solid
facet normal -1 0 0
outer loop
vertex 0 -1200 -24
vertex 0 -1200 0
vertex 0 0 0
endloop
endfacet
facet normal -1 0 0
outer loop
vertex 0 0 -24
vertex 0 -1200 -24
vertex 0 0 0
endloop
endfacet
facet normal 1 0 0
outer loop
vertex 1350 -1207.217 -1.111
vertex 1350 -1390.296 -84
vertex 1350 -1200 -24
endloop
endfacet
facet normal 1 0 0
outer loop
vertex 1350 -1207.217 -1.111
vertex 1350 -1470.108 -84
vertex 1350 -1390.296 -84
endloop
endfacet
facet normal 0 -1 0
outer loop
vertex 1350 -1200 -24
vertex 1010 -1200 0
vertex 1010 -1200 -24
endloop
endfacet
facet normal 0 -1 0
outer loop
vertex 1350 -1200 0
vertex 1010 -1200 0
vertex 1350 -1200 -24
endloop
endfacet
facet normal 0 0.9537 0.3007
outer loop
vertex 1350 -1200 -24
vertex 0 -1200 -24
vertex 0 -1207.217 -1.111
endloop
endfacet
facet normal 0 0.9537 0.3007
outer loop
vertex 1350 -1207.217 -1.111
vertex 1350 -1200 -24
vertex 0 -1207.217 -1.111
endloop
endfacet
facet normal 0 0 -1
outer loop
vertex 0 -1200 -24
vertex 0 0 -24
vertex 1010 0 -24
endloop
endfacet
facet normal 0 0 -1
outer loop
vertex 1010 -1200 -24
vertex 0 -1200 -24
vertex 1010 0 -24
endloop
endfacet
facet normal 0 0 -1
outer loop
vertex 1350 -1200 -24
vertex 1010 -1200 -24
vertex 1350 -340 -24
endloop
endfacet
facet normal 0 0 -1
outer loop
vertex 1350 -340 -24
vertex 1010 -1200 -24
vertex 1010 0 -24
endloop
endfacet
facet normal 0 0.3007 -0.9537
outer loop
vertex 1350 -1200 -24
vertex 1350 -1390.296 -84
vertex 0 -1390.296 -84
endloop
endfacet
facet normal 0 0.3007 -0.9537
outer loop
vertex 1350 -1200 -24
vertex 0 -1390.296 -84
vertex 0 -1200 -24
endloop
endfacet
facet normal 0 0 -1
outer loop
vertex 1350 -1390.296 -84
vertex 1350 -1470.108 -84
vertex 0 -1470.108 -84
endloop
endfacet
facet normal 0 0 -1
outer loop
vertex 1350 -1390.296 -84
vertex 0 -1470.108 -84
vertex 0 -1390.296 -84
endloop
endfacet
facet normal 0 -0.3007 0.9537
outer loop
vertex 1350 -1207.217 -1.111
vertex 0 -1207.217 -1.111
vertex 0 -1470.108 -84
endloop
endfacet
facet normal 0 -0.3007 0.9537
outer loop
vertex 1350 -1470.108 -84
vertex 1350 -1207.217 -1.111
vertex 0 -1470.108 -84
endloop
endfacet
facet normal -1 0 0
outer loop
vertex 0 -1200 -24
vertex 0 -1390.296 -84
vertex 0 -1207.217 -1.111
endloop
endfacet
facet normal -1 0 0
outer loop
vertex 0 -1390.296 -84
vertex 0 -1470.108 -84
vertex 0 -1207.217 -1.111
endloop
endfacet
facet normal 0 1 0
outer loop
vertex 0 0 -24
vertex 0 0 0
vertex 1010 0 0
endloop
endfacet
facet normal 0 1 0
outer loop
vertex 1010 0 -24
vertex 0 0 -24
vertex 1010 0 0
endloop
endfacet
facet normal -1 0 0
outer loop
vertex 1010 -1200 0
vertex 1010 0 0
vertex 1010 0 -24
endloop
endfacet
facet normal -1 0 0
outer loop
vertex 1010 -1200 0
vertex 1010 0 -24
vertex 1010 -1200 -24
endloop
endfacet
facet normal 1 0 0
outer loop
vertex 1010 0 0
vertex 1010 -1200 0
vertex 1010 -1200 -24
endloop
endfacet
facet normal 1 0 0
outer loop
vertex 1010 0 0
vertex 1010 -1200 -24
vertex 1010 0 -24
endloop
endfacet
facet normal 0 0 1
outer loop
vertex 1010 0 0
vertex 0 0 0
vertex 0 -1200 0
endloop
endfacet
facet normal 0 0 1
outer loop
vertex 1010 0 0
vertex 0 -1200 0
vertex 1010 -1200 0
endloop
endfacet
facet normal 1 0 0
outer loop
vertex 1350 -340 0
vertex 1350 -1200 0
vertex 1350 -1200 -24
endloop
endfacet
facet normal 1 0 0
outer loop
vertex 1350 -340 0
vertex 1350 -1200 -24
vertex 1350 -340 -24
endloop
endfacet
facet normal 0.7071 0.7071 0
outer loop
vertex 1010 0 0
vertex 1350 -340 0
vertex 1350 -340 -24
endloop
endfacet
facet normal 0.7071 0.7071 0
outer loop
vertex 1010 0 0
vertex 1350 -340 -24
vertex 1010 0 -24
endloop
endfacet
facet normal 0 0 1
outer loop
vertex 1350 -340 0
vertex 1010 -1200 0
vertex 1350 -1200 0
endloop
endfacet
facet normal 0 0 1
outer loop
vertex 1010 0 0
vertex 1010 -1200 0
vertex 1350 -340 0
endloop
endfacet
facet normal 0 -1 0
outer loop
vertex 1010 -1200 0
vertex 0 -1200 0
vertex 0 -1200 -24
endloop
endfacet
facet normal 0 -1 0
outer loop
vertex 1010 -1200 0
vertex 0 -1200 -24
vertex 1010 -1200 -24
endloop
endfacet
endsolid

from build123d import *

# Parameters (mm, degrees)
F0_W     = 1010
F0_H     = 1200
F1_DEPTH = 24
F3_DEPTH = 1350
F5_DEPTH = 24


with BuildPart() as f1:
    # F0 (on Top) → F1 (new body)
    with BuildSketch(Plane.XY):
        with Locations((505, -600)):
            Rectangle(F0_W, F0_H)
    extrude(amount=-F1_DEPTH)


with BuildPart() as f3:
    # F2 (on Right) → F3 (new body)
    with BuildSketch(Plane.YZ):
        Polygon((-1390.295688, -84), (-1200, -24), (-1207.216939, -1.110793), (-1470.107917, -84), align=None)
    extrude(amount=F3_DEPTH)


with BuildPart() as f5:
    # F4 (on Top) → F5 (new body)
    with BuildSketch(Plane.XY):
        Polygon((1350, -340), (1010, 0), (1010, -1200), (1350, -1200), align=None)
    extrude(amount=-F5_DEPTH)


solid = Compound([f1.part, f3.part, f5.part])
